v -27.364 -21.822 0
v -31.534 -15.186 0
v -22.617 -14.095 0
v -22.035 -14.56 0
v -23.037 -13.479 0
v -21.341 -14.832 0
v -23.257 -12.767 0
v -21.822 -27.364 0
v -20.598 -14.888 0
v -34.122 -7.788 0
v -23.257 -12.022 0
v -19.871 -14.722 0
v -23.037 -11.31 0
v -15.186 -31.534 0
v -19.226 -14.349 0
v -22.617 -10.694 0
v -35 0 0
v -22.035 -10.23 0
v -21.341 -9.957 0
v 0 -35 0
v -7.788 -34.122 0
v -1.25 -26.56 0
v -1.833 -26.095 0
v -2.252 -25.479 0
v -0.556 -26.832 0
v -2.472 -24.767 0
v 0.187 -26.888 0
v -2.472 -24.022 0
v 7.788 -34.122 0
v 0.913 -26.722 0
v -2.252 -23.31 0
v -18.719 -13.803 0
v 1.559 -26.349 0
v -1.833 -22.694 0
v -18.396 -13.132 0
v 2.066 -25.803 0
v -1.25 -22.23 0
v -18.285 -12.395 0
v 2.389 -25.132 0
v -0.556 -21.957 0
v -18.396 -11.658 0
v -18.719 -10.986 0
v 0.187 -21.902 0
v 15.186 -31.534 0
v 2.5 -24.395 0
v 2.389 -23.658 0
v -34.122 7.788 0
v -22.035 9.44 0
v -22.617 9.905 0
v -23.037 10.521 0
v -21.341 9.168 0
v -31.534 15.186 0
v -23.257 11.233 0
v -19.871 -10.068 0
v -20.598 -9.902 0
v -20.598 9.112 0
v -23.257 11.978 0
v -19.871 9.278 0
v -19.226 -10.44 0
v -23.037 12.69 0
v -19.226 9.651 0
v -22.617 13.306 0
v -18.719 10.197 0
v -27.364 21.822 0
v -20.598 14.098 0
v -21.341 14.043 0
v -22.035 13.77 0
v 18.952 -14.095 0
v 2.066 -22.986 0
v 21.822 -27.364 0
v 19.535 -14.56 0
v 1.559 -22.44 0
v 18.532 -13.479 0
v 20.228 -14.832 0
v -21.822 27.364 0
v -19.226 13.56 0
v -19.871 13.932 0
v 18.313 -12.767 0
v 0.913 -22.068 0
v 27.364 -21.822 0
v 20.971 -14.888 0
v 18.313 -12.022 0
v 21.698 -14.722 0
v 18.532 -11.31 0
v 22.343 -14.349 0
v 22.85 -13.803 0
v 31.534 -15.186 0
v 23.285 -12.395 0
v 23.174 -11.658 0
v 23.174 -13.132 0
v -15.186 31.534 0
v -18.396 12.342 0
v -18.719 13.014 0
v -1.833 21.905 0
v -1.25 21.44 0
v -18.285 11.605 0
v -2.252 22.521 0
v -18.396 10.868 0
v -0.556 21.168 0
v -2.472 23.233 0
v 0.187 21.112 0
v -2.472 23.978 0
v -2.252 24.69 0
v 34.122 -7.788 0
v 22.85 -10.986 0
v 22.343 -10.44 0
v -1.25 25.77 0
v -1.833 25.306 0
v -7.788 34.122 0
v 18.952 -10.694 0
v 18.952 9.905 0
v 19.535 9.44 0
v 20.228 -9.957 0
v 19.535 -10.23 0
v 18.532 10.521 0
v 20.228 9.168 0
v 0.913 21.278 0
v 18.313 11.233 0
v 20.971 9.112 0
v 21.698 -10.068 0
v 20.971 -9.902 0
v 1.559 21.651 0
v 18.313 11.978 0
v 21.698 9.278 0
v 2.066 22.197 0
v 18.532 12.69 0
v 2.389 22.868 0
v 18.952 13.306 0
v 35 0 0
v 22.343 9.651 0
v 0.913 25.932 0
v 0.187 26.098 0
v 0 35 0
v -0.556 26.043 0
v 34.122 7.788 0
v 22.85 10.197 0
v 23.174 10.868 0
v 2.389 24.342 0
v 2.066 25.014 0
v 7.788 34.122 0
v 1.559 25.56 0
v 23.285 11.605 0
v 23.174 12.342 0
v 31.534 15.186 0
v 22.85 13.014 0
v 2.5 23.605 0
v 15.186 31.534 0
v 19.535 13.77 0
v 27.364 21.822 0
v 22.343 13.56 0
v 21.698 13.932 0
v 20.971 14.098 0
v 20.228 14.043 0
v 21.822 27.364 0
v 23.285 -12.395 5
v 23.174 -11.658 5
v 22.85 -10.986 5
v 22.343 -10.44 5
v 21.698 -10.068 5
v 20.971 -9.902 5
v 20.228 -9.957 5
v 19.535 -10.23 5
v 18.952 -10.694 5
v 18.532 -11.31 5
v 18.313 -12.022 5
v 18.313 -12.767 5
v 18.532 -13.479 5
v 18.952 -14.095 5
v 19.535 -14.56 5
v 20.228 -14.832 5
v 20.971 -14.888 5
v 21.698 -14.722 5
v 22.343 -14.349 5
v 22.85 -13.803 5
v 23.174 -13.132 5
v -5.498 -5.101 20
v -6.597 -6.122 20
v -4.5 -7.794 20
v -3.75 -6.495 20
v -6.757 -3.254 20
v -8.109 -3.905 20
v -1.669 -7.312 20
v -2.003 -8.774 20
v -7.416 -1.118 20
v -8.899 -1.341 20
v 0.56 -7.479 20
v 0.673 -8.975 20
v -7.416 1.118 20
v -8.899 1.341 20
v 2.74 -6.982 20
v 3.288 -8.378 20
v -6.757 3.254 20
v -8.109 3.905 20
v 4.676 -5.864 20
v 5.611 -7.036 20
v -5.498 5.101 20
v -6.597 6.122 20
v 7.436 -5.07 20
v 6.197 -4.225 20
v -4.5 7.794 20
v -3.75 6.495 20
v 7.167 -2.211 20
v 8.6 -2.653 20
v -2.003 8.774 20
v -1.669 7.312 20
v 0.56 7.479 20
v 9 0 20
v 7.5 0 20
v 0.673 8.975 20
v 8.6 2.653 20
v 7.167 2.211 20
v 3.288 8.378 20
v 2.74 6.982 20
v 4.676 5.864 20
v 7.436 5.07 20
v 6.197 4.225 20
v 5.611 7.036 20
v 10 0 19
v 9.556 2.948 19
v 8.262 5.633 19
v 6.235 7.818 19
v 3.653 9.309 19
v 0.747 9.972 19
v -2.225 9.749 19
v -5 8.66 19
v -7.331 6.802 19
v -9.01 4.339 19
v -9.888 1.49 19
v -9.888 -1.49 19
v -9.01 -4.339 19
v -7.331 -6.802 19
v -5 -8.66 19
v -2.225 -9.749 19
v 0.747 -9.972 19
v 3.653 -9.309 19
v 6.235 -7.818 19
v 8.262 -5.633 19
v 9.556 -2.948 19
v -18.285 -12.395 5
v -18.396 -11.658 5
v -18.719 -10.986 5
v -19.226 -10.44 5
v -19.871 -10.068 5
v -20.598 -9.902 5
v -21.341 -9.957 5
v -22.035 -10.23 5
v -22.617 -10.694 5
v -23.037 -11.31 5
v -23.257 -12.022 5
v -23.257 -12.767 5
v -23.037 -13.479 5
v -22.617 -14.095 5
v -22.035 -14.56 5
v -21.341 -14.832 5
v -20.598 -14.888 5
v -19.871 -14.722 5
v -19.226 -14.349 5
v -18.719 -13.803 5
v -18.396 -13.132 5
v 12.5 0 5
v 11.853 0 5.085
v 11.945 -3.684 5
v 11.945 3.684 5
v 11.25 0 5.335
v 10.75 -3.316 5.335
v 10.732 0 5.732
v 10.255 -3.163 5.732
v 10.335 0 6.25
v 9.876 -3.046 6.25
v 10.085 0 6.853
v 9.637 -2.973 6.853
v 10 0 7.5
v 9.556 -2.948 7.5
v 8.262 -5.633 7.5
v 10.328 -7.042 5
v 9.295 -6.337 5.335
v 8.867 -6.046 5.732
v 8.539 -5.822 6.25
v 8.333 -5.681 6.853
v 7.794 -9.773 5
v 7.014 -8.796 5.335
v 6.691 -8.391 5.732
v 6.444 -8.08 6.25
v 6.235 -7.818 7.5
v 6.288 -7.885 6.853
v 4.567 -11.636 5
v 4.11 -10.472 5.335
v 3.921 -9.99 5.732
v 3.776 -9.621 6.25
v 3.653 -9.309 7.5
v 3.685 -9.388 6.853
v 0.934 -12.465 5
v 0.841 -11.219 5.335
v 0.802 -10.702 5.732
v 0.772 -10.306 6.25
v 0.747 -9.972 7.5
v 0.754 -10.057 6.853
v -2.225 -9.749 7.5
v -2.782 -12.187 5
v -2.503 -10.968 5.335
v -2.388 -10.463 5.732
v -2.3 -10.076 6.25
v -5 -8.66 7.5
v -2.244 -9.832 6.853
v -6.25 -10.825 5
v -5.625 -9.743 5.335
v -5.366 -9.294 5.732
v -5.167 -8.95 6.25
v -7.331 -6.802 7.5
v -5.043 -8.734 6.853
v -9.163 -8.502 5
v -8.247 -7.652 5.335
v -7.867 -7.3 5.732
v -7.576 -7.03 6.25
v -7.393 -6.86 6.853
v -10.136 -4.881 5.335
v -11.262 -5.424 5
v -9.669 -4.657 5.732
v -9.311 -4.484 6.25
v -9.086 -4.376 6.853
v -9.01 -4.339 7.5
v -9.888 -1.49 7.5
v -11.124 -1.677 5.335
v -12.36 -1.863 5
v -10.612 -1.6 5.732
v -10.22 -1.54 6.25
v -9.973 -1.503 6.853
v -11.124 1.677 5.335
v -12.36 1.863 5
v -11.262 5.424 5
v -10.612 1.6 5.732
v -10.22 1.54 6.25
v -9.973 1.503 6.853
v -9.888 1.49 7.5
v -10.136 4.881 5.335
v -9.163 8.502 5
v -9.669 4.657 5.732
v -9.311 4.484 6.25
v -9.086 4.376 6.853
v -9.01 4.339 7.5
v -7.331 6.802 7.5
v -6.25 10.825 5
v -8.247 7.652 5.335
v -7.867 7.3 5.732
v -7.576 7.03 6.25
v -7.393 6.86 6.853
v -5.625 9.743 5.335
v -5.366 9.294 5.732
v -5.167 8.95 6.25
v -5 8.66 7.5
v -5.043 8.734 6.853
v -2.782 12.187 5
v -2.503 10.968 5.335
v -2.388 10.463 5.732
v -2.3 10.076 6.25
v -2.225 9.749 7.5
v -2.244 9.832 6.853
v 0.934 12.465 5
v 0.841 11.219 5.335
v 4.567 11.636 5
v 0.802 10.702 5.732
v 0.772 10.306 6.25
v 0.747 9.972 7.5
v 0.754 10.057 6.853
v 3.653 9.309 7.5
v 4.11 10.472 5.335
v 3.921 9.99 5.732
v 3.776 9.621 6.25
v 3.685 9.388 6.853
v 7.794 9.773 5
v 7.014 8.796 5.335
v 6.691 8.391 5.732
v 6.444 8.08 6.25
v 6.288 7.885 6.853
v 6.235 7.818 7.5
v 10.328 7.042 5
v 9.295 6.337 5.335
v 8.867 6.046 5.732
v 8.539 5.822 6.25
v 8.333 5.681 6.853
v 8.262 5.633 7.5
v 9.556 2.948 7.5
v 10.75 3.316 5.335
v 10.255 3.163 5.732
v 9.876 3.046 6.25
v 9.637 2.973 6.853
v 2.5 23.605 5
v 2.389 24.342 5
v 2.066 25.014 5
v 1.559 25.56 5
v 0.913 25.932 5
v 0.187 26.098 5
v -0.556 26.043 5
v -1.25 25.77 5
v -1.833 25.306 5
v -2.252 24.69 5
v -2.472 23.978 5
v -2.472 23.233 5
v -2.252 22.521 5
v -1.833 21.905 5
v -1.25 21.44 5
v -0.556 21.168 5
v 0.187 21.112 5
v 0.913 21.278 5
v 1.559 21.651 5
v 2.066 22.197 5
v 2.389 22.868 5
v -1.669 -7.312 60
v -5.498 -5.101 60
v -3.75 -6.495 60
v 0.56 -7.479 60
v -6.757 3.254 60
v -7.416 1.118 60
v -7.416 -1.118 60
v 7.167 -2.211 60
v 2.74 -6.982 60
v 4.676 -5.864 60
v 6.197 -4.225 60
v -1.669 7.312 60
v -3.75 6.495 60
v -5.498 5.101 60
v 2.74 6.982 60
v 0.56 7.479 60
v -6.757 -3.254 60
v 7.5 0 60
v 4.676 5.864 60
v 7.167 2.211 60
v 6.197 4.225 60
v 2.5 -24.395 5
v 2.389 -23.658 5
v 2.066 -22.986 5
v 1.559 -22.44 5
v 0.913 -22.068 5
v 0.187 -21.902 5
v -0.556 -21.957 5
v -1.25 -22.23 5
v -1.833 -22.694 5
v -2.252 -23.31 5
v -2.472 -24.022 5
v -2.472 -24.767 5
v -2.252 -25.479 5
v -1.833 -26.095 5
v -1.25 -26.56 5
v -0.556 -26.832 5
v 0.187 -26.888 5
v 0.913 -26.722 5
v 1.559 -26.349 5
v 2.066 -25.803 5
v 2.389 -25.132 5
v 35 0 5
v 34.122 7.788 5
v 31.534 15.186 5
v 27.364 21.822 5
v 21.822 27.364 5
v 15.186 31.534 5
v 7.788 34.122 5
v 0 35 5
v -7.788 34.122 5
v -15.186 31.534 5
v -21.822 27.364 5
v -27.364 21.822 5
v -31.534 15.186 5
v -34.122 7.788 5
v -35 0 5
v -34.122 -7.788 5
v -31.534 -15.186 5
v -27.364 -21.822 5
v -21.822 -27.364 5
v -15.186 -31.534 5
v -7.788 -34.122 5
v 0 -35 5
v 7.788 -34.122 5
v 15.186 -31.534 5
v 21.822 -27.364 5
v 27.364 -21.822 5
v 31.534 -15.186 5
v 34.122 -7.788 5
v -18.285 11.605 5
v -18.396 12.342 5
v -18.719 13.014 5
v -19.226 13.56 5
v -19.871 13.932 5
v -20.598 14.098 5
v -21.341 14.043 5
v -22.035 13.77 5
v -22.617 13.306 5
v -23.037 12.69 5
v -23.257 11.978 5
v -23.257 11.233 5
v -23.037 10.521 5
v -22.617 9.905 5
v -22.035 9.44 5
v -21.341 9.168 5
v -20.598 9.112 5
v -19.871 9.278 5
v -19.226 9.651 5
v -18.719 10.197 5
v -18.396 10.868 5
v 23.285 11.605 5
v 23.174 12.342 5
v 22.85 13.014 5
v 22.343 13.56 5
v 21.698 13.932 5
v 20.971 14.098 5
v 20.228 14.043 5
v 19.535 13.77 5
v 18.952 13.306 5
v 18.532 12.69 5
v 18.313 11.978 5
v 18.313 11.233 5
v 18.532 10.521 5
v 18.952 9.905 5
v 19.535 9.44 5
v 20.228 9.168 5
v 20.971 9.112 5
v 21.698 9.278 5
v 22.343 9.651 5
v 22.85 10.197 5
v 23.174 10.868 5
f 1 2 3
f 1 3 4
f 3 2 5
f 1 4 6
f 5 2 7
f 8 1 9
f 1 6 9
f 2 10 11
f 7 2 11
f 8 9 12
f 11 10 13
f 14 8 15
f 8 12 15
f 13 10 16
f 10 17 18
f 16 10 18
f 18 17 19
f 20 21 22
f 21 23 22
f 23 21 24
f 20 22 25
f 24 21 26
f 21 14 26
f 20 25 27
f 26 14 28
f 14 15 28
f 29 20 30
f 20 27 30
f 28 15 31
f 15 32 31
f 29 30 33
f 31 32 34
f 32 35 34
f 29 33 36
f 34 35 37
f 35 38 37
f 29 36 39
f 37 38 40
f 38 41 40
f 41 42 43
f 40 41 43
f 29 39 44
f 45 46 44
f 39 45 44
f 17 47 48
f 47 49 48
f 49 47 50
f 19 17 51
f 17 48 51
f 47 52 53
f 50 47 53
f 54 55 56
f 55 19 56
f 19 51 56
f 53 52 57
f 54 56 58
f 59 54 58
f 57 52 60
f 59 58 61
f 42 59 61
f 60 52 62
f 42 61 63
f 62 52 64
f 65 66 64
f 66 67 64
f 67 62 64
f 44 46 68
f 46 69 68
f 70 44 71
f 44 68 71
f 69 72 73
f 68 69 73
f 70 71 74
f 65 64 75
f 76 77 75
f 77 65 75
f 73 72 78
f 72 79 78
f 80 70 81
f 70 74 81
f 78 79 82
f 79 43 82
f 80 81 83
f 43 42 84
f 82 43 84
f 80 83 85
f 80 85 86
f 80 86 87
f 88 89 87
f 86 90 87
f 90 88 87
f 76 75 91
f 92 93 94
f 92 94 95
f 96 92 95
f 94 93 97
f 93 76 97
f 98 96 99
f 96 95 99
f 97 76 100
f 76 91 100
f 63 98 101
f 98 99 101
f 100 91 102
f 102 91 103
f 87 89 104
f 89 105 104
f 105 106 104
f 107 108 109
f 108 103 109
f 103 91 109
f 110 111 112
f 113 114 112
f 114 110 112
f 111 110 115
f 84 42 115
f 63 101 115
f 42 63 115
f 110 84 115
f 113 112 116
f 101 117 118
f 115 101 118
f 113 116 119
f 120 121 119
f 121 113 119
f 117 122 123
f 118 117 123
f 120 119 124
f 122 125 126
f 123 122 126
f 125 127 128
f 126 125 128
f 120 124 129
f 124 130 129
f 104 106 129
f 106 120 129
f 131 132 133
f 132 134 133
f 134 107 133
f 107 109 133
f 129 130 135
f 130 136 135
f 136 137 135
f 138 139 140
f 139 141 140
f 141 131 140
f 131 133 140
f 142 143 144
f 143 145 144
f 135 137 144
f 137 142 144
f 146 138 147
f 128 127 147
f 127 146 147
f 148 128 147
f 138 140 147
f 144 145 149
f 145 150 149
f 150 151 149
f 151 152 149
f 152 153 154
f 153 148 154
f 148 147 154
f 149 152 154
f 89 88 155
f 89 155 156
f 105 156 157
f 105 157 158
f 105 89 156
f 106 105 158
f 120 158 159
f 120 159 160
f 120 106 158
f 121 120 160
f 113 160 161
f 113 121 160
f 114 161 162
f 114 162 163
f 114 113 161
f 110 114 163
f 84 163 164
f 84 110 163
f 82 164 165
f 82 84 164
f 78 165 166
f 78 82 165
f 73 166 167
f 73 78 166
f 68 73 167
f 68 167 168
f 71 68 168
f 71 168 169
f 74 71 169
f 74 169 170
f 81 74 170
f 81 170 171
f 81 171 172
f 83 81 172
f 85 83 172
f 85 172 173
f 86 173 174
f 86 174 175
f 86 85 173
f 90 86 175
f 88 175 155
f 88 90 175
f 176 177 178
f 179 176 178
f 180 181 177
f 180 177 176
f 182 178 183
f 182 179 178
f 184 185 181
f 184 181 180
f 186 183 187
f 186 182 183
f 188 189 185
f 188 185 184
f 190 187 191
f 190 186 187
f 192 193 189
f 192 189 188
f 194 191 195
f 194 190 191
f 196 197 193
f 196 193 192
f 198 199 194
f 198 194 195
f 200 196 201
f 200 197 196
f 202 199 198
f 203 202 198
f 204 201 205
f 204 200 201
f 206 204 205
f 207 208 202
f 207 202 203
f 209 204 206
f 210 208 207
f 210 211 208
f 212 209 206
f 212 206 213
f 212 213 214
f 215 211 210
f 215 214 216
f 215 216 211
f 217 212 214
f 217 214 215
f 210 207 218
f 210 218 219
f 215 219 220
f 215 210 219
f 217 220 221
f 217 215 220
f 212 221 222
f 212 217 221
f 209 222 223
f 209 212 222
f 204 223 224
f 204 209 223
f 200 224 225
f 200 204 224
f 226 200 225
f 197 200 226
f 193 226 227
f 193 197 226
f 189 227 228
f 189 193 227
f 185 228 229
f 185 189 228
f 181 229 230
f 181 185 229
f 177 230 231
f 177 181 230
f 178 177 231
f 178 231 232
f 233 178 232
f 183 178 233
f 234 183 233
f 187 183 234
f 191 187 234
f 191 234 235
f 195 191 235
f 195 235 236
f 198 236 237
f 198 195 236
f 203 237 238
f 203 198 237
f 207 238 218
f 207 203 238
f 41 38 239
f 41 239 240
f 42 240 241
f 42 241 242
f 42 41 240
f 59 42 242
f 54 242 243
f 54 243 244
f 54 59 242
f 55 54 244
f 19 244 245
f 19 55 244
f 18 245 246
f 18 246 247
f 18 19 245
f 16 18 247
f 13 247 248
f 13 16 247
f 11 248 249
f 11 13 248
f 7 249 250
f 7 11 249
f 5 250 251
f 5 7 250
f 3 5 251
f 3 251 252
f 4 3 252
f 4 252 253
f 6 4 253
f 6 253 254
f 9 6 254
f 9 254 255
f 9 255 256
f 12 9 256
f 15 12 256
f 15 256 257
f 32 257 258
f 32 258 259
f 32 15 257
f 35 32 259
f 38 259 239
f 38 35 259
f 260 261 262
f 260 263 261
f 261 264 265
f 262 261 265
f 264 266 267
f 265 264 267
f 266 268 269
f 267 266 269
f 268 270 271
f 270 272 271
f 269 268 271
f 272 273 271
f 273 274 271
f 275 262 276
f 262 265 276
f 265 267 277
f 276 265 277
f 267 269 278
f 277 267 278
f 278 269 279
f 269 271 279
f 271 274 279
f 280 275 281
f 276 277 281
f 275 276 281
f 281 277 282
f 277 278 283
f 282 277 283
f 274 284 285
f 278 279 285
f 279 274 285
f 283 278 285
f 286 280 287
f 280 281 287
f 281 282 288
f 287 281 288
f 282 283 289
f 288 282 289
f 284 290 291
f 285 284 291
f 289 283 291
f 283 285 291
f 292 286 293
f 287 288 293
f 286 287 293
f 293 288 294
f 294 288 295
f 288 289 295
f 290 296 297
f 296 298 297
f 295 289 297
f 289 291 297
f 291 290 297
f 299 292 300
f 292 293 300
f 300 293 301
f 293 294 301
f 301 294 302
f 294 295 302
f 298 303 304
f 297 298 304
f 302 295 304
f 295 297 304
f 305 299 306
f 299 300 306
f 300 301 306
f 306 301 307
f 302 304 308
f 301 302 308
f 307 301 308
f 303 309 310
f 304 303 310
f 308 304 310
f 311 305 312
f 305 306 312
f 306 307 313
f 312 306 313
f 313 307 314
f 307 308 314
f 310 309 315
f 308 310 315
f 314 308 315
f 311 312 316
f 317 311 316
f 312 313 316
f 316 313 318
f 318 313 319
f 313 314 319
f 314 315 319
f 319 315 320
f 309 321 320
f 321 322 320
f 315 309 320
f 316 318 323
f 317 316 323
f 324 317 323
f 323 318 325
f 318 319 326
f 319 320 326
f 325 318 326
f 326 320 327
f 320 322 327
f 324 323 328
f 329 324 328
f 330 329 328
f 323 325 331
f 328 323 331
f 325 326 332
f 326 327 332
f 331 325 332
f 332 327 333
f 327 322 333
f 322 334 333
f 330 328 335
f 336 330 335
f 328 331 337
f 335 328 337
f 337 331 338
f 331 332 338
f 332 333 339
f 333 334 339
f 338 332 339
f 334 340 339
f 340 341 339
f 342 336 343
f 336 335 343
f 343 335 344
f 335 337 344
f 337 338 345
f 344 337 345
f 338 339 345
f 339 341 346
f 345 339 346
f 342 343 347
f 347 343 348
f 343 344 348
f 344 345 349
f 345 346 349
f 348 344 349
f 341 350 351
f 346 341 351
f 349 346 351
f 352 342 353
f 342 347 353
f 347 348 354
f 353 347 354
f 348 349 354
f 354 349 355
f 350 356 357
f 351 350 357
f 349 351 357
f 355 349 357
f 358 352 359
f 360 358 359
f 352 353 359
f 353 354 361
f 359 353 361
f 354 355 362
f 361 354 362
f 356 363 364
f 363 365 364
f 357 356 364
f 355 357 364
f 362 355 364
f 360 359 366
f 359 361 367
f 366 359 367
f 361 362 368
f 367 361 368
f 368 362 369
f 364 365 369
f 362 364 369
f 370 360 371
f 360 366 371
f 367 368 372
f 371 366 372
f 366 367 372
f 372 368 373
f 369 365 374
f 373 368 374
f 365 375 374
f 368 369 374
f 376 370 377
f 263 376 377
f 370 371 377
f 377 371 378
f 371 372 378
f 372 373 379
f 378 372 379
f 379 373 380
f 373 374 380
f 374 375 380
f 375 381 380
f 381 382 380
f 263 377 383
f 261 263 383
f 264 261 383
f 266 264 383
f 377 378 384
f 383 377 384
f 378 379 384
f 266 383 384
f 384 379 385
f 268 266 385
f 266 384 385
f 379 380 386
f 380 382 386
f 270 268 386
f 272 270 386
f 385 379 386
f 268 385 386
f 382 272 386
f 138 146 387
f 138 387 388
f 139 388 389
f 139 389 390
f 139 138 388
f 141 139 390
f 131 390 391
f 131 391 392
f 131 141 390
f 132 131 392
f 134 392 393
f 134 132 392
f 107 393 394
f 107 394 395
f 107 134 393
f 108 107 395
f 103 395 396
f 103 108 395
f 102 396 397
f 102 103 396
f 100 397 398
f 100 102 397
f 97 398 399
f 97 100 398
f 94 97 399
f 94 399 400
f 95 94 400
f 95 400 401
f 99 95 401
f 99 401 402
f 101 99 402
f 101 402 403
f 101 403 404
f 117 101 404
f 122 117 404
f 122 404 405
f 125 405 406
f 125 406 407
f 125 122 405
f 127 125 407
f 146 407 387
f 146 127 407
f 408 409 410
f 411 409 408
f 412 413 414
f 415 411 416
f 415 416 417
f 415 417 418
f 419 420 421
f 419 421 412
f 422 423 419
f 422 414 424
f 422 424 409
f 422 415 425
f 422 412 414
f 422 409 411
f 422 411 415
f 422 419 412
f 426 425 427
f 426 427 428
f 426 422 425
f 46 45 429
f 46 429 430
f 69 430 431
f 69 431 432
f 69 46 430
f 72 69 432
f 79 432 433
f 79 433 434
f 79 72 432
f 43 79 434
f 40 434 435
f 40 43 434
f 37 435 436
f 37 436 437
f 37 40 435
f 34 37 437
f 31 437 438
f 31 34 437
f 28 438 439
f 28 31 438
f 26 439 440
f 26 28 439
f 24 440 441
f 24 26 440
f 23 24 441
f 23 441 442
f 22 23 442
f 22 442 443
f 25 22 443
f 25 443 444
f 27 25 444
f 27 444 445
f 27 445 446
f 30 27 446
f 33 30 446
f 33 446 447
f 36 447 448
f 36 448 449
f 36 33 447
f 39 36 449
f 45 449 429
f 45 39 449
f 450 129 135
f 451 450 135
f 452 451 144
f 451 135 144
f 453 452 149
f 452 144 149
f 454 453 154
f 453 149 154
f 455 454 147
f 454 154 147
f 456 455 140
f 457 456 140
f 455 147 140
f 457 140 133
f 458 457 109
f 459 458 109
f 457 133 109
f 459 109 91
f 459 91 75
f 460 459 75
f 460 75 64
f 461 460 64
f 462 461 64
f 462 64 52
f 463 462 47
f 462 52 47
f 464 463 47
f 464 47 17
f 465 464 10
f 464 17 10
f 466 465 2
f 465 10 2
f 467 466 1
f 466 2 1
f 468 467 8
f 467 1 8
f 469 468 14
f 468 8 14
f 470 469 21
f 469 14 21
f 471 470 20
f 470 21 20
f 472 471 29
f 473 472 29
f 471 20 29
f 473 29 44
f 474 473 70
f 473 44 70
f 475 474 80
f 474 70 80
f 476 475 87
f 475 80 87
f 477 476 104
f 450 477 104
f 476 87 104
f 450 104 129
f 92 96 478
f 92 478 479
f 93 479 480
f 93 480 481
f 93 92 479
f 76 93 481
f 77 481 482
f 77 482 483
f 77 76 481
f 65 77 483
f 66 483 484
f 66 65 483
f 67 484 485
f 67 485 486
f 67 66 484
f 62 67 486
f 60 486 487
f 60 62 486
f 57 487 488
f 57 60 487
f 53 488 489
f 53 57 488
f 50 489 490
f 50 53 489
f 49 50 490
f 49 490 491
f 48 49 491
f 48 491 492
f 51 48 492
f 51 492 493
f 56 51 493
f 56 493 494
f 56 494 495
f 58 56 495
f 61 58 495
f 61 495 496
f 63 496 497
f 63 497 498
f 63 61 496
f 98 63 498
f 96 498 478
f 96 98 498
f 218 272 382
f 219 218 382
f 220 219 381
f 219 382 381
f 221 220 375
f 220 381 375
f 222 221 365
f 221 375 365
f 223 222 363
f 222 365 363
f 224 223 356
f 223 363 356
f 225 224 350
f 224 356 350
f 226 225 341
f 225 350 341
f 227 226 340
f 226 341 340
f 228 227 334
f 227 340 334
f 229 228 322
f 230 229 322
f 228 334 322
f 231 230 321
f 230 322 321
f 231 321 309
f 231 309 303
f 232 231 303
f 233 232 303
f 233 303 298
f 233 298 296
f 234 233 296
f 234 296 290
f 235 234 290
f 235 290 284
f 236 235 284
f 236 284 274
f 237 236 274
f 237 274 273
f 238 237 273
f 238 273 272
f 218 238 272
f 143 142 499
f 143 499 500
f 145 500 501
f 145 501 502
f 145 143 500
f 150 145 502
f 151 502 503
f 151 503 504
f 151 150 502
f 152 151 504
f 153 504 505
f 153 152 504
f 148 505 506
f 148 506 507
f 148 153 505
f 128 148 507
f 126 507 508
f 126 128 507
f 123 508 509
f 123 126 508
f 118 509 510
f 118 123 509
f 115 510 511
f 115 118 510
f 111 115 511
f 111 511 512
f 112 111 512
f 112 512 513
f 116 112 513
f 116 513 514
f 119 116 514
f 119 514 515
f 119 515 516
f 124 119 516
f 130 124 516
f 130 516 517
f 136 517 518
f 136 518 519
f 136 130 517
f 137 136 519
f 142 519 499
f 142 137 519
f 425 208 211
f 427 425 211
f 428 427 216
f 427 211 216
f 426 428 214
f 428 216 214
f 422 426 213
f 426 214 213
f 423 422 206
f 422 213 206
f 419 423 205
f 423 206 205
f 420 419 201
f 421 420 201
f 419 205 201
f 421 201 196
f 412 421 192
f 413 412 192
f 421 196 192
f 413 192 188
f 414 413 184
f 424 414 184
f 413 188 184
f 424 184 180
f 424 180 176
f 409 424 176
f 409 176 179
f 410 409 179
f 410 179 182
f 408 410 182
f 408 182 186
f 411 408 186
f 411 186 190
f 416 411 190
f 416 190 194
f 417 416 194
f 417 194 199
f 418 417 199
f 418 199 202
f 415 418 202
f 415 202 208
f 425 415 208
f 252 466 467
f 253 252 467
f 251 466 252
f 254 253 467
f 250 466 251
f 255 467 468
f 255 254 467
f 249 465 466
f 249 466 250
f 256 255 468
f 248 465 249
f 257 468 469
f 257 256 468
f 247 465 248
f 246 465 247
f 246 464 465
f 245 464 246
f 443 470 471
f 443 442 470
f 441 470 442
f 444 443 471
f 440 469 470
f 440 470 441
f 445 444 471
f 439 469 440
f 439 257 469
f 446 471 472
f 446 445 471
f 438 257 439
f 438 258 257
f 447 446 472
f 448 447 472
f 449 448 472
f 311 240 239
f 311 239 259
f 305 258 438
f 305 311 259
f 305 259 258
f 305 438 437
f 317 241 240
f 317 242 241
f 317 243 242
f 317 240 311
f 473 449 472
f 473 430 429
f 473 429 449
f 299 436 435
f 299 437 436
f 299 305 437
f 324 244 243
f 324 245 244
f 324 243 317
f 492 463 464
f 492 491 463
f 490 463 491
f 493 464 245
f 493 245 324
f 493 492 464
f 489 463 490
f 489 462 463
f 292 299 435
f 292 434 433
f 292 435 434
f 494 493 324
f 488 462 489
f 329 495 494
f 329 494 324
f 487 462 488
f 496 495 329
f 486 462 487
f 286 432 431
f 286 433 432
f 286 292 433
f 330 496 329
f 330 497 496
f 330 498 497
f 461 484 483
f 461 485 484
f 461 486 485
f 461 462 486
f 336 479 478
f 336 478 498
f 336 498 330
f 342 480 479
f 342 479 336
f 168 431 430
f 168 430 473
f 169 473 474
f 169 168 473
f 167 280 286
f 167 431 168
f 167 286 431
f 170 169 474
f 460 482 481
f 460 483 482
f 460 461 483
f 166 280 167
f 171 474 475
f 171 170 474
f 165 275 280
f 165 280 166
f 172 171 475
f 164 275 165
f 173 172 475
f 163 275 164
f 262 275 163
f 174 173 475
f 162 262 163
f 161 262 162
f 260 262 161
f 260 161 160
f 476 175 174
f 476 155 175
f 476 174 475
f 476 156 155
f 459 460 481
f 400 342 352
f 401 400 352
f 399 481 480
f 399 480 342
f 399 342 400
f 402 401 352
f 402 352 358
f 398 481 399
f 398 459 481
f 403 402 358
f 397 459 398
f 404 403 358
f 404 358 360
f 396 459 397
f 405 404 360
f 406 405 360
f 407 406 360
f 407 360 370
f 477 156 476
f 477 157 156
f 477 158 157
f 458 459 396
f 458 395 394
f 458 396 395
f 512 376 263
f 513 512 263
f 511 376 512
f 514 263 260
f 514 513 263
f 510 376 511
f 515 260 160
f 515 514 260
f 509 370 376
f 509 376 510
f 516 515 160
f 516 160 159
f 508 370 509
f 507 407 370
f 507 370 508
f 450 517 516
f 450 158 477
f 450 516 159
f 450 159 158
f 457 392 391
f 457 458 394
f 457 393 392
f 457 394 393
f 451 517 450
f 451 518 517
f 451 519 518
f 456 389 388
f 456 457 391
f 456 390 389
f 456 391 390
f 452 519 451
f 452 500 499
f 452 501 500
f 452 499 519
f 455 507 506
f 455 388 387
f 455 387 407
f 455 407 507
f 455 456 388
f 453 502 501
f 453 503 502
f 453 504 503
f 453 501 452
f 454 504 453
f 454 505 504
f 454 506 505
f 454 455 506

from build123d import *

# Parameters (mm, degrees)
F0_R     = 35
F0_R_2   = 2.5
F1_DEPTH = 5
F2_R     = 10
F3_DEPTH = 20
F4_R     = 7.5
F5_DEPTH = 60
F6_R     = 2.5
F7_SIZE  = 1


with BuildPart() as f1:
    # F0 (on Top) → F1 (new body)
    with BuildSketch(Plane.XY):
        Circle(F0_R)
        with Locations((-20.7846096908, -12.3947781175)):
            Circle(F0_R_2, mode=Mode.SUBTRACT)
        with Locations((0, -24.3947781175)):
            Circle(F0_R_2, mode=Mode.SUBTRACT)
        with Locations((20.7846096908, -12.3947781175)):
            Circle(F0_R_2, mode=Mode.SUBTRACT)
        with Locations((-20.7846096908, 11.6052218825)):
            Circle(F0_R_2, mode=Mode.SUBTRACT)
        with Locations((20.7846096908, 11.6052218825)):
            Circle(F0_R_2, mode=Mode.SUBTRACT)
        with Locations((0, 23.6052218825)):
            Circle(F0_R_2, mode=Mode.SUBTRACT)
    extrude(amount=F1_DEPTH)

    # F2 (on Top) → F3 (join)
    with BuildSketch(Plane.XY):
        Circle(F2_R)
    extrude(amount=F3_DEPTH)

    # F4 (on Top) → F5 (join)
    with BuildSketch(Plane.XY):
        Circle(F4_R)
    extrude(amount=F5_DEPTH)

    # F6
    f6_edges = [f1.edges().sort_by_distance(p)[0] for p in [
        (-10, 0, 5),
    ]]
    fillet(f6_edges, radius=F6_R)

    # F7
    f7_edges = [f1.edges().sort_by_distance(p)[0] for p in [
        (-10, 0, 20),
    ]]
    chamfer(f7_edges, length=F7_SIZE)


solid = f1.part
